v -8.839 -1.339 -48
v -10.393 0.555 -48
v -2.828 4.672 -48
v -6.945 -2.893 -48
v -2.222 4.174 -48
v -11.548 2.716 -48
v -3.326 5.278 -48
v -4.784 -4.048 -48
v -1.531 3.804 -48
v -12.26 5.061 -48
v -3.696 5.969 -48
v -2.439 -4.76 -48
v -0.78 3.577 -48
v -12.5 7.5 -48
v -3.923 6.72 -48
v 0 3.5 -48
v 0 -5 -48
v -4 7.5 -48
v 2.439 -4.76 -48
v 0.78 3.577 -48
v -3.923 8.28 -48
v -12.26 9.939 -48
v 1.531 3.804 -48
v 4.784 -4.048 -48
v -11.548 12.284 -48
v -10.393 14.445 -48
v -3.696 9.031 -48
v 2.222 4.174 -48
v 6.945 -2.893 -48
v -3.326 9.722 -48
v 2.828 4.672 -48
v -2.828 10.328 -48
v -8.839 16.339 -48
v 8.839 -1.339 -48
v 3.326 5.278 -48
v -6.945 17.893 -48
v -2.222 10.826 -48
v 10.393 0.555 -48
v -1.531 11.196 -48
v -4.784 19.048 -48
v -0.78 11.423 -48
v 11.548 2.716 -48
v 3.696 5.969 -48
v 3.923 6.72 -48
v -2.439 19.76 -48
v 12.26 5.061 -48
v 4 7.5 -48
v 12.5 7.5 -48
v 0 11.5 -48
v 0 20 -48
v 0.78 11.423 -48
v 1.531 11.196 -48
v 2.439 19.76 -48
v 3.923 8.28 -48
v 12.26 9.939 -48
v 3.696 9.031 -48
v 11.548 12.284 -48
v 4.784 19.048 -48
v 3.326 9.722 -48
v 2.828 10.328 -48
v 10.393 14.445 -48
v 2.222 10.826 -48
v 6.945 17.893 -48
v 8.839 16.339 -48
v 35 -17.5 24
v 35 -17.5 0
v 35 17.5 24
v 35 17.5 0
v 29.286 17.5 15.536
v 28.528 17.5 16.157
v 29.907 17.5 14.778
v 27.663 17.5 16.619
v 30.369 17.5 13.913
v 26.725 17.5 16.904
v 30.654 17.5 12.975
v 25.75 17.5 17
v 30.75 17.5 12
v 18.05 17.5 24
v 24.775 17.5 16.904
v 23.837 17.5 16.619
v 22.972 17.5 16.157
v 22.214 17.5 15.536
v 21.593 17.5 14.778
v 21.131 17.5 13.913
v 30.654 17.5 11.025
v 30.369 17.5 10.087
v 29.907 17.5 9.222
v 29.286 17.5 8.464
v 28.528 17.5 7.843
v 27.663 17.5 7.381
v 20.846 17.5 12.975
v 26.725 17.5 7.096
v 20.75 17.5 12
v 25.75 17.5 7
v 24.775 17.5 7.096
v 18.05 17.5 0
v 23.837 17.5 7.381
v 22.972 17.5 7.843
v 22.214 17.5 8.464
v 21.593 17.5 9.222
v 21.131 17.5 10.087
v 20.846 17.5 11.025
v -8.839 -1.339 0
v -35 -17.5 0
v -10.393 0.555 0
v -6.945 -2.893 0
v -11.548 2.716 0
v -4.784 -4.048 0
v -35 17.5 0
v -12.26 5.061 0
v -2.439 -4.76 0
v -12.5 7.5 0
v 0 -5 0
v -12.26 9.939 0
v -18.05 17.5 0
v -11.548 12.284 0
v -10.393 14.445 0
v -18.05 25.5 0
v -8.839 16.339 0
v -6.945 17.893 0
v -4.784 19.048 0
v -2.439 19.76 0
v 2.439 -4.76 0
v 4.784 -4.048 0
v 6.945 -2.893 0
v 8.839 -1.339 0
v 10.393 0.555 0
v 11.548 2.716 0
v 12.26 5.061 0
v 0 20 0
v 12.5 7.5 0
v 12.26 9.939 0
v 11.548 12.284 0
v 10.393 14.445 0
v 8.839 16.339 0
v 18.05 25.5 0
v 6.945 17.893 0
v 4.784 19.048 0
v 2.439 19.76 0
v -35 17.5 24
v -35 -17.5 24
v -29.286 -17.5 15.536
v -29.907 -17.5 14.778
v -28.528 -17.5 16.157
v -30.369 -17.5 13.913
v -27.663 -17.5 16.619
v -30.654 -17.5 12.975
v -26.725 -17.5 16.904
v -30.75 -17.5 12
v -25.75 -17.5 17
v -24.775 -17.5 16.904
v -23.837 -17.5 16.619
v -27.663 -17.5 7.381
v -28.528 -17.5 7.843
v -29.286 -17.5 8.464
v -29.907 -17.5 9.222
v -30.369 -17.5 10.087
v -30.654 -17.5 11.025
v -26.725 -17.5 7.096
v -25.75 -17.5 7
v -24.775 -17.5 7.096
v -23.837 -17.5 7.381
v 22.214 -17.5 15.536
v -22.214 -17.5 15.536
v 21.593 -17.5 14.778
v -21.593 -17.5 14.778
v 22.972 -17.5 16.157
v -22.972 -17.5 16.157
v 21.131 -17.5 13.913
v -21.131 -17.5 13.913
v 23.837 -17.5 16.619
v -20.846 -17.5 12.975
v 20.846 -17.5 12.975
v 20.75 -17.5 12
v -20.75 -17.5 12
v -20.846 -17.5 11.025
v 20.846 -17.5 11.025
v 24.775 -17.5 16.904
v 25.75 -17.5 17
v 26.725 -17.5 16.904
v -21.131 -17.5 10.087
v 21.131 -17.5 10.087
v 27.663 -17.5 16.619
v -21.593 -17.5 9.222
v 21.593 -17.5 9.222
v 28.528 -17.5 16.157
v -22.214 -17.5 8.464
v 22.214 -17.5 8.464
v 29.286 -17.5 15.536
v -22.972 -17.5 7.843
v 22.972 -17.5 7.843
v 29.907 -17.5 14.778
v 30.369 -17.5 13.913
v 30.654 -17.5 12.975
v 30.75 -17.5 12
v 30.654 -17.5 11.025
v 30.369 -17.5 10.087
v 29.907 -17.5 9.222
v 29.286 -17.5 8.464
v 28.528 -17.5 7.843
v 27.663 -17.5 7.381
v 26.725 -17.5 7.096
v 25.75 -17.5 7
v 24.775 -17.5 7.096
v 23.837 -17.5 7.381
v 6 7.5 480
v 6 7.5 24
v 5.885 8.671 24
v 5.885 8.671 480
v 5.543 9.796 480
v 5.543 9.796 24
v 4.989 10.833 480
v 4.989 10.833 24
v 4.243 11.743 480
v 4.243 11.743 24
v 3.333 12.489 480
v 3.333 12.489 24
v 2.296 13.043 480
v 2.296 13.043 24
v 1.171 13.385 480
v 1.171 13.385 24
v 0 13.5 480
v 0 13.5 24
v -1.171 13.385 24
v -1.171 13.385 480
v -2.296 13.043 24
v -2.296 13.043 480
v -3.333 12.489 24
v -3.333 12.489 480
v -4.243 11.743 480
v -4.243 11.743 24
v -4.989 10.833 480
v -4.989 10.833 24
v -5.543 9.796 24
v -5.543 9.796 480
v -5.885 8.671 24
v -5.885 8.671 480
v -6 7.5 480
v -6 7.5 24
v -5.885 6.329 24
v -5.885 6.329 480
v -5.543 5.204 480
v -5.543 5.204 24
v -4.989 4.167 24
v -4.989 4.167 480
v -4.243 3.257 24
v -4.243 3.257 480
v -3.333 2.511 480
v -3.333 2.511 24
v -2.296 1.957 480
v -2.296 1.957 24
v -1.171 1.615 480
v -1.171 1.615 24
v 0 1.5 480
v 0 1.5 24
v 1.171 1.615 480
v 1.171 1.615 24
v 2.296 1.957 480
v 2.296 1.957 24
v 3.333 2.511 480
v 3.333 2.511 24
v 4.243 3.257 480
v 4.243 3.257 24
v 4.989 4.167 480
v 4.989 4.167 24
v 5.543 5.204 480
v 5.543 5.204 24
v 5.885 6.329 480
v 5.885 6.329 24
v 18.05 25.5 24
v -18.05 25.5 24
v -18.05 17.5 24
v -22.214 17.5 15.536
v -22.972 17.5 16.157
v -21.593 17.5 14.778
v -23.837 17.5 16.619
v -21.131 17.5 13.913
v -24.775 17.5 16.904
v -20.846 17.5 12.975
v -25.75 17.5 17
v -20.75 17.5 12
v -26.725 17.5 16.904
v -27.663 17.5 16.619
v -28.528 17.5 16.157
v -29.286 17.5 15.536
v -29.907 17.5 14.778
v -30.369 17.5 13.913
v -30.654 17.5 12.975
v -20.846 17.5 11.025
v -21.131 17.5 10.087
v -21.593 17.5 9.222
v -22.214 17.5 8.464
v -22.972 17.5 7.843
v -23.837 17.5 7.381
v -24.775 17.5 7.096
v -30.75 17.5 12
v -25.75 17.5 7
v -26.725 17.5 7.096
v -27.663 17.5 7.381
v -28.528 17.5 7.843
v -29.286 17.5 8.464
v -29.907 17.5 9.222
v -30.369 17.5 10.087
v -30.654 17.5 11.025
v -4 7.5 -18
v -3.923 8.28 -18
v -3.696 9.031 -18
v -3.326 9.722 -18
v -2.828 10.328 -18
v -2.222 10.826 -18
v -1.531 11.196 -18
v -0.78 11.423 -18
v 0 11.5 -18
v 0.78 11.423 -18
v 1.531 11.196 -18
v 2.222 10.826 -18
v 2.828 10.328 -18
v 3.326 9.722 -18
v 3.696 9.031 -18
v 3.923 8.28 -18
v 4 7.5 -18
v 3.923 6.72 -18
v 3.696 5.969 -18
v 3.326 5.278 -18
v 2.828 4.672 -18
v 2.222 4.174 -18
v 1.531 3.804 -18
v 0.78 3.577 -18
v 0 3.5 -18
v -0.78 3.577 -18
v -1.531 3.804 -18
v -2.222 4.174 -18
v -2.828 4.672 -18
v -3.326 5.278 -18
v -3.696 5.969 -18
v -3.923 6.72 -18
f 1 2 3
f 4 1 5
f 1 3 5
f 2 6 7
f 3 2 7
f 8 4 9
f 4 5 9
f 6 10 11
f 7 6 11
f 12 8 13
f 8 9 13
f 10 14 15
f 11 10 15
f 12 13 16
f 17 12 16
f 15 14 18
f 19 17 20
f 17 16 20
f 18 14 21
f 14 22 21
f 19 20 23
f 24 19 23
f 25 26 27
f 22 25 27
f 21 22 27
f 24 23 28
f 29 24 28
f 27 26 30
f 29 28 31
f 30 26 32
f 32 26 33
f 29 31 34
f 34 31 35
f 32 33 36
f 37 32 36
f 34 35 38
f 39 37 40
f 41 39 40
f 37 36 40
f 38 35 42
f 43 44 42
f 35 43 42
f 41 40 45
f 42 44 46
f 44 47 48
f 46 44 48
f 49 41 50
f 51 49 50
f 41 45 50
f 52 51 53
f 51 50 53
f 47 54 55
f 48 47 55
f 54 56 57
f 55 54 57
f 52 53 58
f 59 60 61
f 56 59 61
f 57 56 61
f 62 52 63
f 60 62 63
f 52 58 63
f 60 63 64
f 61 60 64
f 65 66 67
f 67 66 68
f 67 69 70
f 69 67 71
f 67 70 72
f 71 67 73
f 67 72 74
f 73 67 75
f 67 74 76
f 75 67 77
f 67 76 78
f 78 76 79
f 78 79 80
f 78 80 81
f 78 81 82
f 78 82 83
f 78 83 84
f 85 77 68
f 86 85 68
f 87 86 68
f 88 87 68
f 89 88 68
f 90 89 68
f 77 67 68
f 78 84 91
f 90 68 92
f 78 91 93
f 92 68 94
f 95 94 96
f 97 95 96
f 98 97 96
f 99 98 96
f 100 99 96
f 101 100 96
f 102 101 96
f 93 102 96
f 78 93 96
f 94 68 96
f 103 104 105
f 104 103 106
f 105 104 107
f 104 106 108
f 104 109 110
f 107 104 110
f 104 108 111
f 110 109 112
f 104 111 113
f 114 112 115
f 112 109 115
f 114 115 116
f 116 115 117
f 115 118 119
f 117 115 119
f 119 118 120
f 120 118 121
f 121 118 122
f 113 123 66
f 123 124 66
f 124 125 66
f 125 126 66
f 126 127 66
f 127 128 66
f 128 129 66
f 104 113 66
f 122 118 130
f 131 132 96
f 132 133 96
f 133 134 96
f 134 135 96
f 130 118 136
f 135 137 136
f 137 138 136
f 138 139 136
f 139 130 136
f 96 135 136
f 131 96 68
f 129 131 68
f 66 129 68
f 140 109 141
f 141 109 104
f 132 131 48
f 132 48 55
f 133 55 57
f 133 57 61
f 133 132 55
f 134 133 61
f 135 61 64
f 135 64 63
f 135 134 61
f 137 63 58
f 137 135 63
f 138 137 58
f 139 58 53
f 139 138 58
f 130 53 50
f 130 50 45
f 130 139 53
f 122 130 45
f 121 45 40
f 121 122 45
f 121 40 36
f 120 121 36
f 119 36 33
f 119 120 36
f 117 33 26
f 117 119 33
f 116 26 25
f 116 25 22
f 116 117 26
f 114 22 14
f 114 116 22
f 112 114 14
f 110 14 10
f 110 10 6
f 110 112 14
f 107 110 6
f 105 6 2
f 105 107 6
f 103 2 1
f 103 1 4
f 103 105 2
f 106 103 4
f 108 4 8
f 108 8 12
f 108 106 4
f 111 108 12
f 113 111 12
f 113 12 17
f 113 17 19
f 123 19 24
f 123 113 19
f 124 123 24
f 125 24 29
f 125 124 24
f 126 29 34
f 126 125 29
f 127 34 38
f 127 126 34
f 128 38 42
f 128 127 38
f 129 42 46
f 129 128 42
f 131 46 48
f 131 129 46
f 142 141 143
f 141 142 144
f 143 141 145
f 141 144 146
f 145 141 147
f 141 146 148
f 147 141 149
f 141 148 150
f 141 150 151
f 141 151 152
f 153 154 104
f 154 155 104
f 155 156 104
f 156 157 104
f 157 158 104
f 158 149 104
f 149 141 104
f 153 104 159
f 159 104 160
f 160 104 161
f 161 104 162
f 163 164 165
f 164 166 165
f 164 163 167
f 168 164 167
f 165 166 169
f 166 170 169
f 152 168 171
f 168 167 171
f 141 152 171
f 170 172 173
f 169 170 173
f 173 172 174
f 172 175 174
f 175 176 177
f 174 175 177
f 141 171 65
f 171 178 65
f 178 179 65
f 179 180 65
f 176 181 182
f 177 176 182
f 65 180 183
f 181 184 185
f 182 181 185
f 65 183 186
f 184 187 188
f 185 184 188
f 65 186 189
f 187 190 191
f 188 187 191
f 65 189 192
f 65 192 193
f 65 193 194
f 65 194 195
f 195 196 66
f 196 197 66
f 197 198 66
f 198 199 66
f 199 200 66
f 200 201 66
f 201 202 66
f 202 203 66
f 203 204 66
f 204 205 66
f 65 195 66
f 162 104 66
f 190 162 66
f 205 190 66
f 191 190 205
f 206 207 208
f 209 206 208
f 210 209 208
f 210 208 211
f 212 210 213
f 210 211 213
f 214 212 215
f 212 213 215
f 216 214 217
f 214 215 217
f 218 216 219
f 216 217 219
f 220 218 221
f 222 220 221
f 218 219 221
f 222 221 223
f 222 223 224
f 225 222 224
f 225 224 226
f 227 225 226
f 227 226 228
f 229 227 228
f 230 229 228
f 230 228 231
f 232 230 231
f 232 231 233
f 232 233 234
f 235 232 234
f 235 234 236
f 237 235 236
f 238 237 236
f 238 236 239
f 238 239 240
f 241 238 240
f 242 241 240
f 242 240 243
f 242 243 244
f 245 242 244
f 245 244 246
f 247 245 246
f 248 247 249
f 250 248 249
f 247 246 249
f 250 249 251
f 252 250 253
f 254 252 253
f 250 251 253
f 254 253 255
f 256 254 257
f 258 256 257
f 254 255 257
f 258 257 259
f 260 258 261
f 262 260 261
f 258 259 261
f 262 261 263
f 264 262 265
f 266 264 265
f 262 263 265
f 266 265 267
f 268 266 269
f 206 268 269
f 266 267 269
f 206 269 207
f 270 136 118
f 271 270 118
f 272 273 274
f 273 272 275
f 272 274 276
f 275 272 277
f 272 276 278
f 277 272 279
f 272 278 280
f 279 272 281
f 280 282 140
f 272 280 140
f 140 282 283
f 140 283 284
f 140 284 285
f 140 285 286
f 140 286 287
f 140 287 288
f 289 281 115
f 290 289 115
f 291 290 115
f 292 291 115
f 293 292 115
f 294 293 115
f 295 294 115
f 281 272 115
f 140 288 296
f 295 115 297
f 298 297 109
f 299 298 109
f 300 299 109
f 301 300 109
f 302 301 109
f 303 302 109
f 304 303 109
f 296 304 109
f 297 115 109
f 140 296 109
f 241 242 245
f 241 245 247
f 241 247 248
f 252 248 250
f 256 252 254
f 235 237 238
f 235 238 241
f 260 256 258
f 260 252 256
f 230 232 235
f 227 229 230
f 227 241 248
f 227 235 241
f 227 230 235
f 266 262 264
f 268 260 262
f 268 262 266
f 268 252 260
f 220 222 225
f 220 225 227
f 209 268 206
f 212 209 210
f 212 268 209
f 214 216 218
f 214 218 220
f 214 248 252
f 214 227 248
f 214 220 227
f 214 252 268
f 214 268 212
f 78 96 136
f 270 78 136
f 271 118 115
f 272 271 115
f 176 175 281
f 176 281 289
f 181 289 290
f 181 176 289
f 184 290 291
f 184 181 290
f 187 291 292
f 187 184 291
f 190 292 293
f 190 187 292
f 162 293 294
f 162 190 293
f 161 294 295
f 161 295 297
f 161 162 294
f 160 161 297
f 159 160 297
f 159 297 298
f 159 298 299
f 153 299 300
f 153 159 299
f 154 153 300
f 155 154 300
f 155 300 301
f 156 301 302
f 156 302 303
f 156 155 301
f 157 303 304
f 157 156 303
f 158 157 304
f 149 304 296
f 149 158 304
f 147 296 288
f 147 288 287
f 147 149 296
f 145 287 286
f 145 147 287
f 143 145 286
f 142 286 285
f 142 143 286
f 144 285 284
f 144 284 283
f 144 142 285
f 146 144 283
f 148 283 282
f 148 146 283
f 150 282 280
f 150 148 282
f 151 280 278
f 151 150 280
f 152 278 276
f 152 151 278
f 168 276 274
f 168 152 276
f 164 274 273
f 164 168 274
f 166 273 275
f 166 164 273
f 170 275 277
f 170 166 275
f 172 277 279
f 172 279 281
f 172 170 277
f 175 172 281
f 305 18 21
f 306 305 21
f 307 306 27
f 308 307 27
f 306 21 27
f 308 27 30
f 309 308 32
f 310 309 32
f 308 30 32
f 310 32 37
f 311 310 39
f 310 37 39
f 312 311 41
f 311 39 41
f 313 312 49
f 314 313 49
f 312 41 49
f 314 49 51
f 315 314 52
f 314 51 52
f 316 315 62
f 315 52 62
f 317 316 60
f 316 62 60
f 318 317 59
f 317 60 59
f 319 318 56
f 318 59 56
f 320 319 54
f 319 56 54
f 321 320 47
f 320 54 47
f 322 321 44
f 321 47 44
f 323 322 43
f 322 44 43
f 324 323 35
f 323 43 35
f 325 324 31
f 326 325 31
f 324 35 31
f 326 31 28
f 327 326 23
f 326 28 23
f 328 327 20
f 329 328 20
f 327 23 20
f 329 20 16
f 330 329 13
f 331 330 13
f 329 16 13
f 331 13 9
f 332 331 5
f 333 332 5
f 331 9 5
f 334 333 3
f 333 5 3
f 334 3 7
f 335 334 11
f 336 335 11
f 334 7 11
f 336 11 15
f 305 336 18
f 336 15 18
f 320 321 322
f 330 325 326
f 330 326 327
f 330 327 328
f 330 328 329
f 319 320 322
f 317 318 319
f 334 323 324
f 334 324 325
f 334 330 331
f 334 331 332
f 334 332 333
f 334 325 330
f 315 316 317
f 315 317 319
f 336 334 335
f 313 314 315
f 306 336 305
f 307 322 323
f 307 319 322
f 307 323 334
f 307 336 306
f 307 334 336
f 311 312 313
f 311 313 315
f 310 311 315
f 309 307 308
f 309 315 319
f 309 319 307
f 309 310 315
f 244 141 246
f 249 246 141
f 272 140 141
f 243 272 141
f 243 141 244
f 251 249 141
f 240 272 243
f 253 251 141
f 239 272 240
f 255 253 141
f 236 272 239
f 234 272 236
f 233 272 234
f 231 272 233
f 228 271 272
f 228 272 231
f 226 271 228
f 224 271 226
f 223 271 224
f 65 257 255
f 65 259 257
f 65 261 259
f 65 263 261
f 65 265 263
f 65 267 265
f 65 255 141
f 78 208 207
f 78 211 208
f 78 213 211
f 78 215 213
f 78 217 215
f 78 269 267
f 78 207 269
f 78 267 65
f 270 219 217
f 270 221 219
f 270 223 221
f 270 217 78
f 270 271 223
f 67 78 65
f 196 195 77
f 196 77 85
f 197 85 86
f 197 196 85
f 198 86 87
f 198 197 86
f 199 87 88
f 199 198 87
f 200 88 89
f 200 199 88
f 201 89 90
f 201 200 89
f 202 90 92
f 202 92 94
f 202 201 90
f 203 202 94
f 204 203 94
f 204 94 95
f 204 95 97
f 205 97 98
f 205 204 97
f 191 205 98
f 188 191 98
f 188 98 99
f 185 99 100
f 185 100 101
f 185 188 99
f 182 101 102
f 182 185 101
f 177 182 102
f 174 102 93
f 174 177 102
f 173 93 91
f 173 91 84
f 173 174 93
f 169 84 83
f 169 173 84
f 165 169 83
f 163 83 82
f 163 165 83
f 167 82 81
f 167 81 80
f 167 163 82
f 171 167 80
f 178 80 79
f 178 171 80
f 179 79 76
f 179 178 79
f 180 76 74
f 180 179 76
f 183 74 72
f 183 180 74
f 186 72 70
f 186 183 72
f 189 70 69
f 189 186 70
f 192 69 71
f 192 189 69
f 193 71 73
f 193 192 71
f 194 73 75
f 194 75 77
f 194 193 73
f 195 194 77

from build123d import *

# Parameters (mm, degrees)
SKETCH1_R                    = 12.5
SKETCH1_R_2                  = 6
BOSS_EXTRUDE1_DEPTH          = 24
SKETCH1_2_R                  = 6
BOSS_EXTRUDE2_DEPTH          = 480
SKETCH1_4_R                  = 12.5
BOSS_EXTRUDE3_DEPTH          = 48
M8_START                     = -17.5
M8_CLEARANCE_HOLE1_OUTLINE_R = 5
M8_CLEARANCE_HOLE1_DEPTH     = 35
SKETCH4_R                    = 4
CUT_EXTRUDE1_DEPTH           = 30


# Read off the part's stored shape, not the designer's step: M8 Clearance Hole1
with BuildPart() as part:
    # Sketch1 → Boss-Extrude1 (new body)
    # profile 1 of 2: a face of its own
    with BuildSketch(Plane.XY):
        Polygon((18.05, 17.5), (18.05, 25.5), (-18.05, 25.5), (-18.05, 17.5), (-35, 17.5), (-35, -17.5), (35, -17.5), (35, 17.5), align=None)
        with Locations((0, 7.5)):
            Circle(SKETCH1_R, mode=Mode.SUBTRACT)
    # profile 2 of 2: a face of its own
    with BuildSketch(Plane.XY):
        with Locations((0, 7.5)):
            Circle(SKETCH1_R)
        with Locations((0, 7.5)):
            Circle(SKETCH1_R_2, mode=Mode.SUBTRACT)
    extrude(amount=BOSS_EXTRUDE1_DEPTH)

    # Sketch1<2> → Boss-Extrude2 (add)
    with BuildSketch(Plane.XY):
        with Locations((0, 7.5)):
            Circle(SKETCH1_2_R)
    extrude(amount=BOSS_EXTRUDE2_DEPTH)

    # Sketch1<4> → Boss-Extrude3 (add)
    with BuildSketch(Plane.XY):
        with Locations((0, 7.5)):
            Circle(SKETCH1_4_R)
    extrude(amount=-BOSS_EXTRUDE3_DEPTH)

    # M8 Clearance Hole1 outline → M8 Clearance Hole1 (cut)
    with BuildSketch(Plane(origin=(0, 0, 0), x_dir=(1, 0, 0), z_dir=(0, 1, 0)).offset(M8_START)):
        with Locations((25.75, -12)):
            Circle(M8_CLEARANCE_HOLE1_OUTLINE_R)
        with Locations((-25.75, -12)):
            Circle(M8_CLEARANCE_HOLE1_OUTLINE_R)
    extrude(amount=M8_CLEARANCE_HOLE1_DEPTH, mode=Mode.SUBTRACT)

    # Sketch4 → Cut-Extrude1 (cut)
    with BuildSketch(Plane(origin=(0, 0, -48), x_dir=(-1, 0, 0), z_dir=(0, 0, -1))):
        with Locations((0, 7.5)):
            Circle(SKETCH4_R)
    extrude(amount=-CUT_EXTRUDE1_DEPTH, mode=Mode.SUBTRACT)


solid = part.part
